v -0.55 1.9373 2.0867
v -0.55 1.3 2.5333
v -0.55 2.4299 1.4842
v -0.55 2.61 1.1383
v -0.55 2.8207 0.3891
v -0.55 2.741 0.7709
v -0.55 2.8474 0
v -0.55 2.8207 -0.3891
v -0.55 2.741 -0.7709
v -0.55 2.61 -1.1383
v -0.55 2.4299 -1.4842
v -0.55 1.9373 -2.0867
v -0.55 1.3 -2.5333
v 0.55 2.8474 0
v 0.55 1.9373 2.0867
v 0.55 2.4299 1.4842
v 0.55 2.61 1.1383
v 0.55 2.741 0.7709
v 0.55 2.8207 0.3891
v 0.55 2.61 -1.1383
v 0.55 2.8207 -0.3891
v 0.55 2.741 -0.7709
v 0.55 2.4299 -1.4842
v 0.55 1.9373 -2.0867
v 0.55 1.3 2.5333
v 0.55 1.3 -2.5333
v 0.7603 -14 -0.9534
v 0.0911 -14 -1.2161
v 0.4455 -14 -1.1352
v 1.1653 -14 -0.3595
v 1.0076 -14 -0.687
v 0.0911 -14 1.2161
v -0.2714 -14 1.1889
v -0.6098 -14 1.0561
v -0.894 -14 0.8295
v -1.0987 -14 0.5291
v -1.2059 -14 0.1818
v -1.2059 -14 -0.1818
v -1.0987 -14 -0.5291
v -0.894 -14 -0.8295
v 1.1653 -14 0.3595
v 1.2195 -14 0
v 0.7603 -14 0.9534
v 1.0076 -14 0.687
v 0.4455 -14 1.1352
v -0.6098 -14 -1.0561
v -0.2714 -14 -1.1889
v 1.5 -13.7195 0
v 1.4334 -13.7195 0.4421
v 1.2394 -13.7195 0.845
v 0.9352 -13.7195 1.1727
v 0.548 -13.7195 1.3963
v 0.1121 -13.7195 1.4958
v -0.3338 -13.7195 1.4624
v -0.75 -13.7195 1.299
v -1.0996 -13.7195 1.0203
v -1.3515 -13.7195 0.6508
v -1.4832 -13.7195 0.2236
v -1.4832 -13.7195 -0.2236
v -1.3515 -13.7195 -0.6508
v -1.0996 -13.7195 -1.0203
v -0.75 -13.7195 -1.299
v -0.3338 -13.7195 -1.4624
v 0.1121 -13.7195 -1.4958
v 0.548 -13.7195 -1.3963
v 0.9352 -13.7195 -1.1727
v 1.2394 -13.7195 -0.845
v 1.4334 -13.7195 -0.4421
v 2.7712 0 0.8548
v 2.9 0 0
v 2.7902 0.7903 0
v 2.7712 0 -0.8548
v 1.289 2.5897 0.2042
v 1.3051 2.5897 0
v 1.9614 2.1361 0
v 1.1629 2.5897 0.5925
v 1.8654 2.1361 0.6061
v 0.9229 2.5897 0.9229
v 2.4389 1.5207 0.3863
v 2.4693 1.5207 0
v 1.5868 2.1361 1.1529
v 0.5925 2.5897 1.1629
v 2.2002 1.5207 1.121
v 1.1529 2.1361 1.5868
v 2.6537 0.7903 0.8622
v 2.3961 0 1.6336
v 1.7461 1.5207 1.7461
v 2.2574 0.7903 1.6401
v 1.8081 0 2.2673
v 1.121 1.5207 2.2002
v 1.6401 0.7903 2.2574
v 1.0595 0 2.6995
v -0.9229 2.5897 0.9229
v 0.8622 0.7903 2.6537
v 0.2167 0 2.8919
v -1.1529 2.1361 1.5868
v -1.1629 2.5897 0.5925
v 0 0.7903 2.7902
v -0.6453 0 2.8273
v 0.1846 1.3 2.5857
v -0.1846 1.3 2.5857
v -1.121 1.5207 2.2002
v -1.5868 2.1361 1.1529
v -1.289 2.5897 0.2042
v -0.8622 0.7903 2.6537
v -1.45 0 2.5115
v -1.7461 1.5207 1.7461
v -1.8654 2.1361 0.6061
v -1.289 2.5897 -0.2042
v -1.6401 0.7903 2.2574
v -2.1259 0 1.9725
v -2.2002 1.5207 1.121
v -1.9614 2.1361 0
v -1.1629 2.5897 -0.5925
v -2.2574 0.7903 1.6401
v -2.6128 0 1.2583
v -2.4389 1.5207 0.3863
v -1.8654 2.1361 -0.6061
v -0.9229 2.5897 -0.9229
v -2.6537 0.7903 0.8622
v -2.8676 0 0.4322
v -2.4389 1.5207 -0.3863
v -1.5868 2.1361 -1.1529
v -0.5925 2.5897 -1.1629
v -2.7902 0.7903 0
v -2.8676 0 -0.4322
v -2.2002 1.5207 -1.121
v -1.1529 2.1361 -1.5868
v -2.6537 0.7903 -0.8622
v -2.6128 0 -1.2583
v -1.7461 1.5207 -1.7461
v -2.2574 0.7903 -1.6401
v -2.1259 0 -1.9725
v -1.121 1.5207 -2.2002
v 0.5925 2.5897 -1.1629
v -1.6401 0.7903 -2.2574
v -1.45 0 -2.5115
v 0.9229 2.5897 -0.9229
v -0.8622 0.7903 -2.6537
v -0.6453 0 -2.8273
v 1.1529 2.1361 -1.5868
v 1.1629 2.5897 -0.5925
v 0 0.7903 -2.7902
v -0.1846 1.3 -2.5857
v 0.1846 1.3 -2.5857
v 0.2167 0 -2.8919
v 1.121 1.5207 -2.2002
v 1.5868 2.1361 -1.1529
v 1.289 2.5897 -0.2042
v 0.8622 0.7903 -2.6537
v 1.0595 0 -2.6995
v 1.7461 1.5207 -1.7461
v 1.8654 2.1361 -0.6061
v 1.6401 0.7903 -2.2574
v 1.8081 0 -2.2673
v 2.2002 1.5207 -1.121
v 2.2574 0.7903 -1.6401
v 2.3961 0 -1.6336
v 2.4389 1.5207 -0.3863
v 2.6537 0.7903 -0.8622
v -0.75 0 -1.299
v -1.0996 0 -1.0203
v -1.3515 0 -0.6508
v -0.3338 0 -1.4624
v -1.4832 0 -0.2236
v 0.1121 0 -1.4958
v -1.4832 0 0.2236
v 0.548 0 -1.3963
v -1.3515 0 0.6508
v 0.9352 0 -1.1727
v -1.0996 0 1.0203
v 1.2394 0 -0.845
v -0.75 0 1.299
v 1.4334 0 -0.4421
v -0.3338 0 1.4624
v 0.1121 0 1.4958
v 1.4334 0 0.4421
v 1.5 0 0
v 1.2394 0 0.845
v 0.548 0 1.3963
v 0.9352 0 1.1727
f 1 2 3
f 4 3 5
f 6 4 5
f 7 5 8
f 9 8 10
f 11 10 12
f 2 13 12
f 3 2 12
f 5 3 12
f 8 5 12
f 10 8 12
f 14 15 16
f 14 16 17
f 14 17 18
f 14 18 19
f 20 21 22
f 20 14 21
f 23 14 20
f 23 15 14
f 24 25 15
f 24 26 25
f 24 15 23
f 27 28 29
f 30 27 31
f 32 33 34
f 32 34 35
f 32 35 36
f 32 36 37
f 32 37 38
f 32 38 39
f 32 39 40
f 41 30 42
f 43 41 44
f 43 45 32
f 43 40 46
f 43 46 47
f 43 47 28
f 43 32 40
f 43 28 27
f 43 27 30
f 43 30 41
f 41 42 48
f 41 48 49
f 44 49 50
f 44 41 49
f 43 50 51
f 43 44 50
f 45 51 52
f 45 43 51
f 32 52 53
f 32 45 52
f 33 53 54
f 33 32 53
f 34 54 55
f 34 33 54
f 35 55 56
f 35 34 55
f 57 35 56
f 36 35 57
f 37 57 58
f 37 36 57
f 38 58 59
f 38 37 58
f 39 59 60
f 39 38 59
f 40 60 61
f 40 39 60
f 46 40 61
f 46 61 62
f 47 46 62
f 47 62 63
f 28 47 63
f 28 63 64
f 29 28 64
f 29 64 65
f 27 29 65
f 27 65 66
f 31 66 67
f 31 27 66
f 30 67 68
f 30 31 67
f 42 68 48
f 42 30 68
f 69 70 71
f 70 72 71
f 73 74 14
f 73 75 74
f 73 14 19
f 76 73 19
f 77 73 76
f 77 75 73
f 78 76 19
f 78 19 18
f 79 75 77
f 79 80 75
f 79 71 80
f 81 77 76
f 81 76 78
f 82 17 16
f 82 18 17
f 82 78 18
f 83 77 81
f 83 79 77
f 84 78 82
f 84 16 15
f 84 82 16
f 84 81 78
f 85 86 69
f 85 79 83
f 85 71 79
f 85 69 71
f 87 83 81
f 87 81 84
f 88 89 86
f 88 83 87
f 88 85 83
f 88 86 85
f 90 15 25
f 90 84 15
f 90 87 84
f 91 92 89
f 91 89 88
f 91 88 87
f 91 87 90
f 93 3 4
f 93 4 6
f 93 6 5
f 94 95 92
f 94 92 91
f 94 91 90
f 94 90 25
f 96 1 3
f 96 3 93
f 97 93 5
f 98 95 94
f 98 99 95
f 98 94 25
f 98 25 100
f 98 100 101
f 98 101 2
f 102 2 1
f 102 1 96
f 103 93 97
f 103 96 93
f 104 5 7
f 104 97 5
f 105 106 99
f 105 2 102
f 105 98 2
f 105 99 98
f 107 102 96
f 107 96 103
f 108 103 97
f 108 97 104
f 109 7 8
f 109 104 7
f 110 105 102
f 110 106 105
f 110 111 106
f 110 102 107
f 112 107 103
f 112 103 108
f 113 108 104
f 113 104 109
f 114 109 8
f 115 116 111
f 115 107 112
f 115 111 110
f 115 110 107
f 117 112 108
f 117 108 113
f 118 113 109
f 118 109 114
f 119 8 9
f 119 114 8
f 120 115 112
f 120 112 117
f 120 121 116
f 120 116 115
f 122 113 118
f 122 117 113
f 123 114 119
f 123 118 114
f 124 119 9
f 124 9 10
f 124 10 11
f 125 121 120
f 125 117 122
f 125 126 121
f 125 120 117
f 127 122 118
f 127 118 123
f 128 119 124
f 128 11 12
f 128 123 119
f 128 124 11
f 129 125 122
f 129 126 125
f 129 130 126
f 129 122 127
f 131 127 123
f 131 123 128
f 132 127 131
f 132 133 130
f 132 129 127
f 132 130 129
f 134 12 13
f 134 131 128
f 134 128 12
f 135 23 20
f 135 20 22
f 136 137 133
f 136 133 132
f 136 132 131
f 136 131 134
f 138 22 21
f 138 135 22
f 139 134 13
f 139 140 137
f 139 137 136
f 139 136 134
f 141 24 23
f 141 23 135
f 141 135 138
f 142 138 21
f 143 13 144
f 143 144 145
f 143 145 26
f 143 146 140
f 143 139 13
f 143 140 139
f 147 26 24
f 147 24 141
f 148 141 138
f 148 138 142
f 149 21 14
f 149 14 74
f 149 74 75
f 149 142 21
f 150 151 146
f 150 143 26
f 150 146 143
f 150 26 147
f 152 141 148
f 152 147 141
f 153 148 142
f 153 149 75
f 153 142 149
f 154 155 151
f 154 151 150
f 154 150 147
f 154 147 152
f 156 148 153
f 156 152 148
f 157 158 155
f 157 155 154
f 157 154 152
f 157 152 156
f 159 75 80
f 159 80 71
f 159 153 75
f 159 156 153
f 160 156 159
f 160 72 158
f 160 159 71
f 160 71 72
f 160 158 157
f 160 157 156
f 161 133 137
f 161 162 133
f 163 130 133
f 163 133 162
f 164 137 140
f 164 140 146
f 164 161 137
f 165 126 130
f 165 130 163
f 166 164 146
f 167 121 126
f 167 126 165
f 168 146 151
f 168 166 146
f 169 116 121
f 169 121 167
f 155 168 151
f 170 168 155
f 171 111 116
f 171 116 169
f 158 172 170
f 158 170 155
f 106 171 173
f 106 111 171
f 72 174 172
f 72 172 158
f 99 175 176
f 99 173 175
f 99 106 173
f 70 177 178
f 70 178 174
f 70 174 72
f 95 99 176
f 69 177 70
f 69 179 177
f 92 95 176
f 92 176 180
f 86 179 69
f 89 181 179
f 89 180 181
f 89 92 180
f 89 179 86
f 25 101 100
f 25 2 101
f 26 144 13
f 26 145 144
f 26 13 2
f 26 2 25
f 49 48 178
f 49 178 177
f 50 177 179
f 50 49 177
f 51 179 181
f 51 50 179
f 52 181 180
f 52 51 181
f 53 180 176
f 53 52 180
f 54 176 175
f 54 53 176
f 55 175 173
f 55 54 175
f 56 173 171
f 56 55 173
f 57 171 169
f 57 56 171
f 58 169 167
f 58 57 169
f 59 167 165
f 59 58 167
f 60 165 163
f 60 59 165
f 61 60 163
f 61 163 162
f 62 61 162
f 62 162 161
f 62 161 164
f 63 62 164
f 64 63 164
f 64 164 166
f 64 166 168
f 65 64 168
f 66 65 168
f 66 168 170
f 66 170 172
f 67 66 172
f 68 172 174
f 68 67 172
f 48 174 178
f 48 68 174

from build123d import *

# Parameters (mm, degrees)
CHAMFER_1_SIZE           = 0.2805
SKETCH_4_W               = 1.1
SKETCH_4_H               = 3.2
CUT_EXTRUDE_2_DEPTH      = 3.9
CUT_EXTRUDE_2_DEPTH_BACK = 3.9


with BuildPart() as part:
    # Эскиз1 → Повернуть1 (revolve)
    with BuildSketch(Plane.XY):
        with BuildLine():
            ThreePointArc((0, 2.9), (2.050609665, 2.050609665), (2.9, 0))
            Line((2.9, 0), (1.5, 0))
            Line((1.5, 0), (1.5, -14))
            Line((1.5, -14), (0, -14))
            Line((0, -14), (0, 2.9))
        make_face()
    revolve(axis=Axis((0, 2.9, 0), (0, -1, 0)))

    # Фаска1
    chamfer_1_edges = [part.edges().sort_by_distance(p)[0] for p in [
        (-1.5, -14, 0),
    ]]
    chamfer(chamfer_1_edges, length=CHAMFER_1_SIZE)

    # Эскиз4 → Вырез-Вытянуть2 (cut, two sides)
    with BuildSketch(Plane.XY) as cut_extrude_2_sk:
        with Locations((0, 2.9)):
            Rectangle(SKETCH_4_W, SKETCH_4_H)
    extrude(amount=CUT_EXTRUDE_2_DEPTH, mode=Mode.SUBTRACT)
    extrude(cut_extrude_2_sk.sketch, amount=-CUT_EXTRUDE_2_DEPTH_BACK, mode=Mode.SUBTRACT)


solid = part.part
